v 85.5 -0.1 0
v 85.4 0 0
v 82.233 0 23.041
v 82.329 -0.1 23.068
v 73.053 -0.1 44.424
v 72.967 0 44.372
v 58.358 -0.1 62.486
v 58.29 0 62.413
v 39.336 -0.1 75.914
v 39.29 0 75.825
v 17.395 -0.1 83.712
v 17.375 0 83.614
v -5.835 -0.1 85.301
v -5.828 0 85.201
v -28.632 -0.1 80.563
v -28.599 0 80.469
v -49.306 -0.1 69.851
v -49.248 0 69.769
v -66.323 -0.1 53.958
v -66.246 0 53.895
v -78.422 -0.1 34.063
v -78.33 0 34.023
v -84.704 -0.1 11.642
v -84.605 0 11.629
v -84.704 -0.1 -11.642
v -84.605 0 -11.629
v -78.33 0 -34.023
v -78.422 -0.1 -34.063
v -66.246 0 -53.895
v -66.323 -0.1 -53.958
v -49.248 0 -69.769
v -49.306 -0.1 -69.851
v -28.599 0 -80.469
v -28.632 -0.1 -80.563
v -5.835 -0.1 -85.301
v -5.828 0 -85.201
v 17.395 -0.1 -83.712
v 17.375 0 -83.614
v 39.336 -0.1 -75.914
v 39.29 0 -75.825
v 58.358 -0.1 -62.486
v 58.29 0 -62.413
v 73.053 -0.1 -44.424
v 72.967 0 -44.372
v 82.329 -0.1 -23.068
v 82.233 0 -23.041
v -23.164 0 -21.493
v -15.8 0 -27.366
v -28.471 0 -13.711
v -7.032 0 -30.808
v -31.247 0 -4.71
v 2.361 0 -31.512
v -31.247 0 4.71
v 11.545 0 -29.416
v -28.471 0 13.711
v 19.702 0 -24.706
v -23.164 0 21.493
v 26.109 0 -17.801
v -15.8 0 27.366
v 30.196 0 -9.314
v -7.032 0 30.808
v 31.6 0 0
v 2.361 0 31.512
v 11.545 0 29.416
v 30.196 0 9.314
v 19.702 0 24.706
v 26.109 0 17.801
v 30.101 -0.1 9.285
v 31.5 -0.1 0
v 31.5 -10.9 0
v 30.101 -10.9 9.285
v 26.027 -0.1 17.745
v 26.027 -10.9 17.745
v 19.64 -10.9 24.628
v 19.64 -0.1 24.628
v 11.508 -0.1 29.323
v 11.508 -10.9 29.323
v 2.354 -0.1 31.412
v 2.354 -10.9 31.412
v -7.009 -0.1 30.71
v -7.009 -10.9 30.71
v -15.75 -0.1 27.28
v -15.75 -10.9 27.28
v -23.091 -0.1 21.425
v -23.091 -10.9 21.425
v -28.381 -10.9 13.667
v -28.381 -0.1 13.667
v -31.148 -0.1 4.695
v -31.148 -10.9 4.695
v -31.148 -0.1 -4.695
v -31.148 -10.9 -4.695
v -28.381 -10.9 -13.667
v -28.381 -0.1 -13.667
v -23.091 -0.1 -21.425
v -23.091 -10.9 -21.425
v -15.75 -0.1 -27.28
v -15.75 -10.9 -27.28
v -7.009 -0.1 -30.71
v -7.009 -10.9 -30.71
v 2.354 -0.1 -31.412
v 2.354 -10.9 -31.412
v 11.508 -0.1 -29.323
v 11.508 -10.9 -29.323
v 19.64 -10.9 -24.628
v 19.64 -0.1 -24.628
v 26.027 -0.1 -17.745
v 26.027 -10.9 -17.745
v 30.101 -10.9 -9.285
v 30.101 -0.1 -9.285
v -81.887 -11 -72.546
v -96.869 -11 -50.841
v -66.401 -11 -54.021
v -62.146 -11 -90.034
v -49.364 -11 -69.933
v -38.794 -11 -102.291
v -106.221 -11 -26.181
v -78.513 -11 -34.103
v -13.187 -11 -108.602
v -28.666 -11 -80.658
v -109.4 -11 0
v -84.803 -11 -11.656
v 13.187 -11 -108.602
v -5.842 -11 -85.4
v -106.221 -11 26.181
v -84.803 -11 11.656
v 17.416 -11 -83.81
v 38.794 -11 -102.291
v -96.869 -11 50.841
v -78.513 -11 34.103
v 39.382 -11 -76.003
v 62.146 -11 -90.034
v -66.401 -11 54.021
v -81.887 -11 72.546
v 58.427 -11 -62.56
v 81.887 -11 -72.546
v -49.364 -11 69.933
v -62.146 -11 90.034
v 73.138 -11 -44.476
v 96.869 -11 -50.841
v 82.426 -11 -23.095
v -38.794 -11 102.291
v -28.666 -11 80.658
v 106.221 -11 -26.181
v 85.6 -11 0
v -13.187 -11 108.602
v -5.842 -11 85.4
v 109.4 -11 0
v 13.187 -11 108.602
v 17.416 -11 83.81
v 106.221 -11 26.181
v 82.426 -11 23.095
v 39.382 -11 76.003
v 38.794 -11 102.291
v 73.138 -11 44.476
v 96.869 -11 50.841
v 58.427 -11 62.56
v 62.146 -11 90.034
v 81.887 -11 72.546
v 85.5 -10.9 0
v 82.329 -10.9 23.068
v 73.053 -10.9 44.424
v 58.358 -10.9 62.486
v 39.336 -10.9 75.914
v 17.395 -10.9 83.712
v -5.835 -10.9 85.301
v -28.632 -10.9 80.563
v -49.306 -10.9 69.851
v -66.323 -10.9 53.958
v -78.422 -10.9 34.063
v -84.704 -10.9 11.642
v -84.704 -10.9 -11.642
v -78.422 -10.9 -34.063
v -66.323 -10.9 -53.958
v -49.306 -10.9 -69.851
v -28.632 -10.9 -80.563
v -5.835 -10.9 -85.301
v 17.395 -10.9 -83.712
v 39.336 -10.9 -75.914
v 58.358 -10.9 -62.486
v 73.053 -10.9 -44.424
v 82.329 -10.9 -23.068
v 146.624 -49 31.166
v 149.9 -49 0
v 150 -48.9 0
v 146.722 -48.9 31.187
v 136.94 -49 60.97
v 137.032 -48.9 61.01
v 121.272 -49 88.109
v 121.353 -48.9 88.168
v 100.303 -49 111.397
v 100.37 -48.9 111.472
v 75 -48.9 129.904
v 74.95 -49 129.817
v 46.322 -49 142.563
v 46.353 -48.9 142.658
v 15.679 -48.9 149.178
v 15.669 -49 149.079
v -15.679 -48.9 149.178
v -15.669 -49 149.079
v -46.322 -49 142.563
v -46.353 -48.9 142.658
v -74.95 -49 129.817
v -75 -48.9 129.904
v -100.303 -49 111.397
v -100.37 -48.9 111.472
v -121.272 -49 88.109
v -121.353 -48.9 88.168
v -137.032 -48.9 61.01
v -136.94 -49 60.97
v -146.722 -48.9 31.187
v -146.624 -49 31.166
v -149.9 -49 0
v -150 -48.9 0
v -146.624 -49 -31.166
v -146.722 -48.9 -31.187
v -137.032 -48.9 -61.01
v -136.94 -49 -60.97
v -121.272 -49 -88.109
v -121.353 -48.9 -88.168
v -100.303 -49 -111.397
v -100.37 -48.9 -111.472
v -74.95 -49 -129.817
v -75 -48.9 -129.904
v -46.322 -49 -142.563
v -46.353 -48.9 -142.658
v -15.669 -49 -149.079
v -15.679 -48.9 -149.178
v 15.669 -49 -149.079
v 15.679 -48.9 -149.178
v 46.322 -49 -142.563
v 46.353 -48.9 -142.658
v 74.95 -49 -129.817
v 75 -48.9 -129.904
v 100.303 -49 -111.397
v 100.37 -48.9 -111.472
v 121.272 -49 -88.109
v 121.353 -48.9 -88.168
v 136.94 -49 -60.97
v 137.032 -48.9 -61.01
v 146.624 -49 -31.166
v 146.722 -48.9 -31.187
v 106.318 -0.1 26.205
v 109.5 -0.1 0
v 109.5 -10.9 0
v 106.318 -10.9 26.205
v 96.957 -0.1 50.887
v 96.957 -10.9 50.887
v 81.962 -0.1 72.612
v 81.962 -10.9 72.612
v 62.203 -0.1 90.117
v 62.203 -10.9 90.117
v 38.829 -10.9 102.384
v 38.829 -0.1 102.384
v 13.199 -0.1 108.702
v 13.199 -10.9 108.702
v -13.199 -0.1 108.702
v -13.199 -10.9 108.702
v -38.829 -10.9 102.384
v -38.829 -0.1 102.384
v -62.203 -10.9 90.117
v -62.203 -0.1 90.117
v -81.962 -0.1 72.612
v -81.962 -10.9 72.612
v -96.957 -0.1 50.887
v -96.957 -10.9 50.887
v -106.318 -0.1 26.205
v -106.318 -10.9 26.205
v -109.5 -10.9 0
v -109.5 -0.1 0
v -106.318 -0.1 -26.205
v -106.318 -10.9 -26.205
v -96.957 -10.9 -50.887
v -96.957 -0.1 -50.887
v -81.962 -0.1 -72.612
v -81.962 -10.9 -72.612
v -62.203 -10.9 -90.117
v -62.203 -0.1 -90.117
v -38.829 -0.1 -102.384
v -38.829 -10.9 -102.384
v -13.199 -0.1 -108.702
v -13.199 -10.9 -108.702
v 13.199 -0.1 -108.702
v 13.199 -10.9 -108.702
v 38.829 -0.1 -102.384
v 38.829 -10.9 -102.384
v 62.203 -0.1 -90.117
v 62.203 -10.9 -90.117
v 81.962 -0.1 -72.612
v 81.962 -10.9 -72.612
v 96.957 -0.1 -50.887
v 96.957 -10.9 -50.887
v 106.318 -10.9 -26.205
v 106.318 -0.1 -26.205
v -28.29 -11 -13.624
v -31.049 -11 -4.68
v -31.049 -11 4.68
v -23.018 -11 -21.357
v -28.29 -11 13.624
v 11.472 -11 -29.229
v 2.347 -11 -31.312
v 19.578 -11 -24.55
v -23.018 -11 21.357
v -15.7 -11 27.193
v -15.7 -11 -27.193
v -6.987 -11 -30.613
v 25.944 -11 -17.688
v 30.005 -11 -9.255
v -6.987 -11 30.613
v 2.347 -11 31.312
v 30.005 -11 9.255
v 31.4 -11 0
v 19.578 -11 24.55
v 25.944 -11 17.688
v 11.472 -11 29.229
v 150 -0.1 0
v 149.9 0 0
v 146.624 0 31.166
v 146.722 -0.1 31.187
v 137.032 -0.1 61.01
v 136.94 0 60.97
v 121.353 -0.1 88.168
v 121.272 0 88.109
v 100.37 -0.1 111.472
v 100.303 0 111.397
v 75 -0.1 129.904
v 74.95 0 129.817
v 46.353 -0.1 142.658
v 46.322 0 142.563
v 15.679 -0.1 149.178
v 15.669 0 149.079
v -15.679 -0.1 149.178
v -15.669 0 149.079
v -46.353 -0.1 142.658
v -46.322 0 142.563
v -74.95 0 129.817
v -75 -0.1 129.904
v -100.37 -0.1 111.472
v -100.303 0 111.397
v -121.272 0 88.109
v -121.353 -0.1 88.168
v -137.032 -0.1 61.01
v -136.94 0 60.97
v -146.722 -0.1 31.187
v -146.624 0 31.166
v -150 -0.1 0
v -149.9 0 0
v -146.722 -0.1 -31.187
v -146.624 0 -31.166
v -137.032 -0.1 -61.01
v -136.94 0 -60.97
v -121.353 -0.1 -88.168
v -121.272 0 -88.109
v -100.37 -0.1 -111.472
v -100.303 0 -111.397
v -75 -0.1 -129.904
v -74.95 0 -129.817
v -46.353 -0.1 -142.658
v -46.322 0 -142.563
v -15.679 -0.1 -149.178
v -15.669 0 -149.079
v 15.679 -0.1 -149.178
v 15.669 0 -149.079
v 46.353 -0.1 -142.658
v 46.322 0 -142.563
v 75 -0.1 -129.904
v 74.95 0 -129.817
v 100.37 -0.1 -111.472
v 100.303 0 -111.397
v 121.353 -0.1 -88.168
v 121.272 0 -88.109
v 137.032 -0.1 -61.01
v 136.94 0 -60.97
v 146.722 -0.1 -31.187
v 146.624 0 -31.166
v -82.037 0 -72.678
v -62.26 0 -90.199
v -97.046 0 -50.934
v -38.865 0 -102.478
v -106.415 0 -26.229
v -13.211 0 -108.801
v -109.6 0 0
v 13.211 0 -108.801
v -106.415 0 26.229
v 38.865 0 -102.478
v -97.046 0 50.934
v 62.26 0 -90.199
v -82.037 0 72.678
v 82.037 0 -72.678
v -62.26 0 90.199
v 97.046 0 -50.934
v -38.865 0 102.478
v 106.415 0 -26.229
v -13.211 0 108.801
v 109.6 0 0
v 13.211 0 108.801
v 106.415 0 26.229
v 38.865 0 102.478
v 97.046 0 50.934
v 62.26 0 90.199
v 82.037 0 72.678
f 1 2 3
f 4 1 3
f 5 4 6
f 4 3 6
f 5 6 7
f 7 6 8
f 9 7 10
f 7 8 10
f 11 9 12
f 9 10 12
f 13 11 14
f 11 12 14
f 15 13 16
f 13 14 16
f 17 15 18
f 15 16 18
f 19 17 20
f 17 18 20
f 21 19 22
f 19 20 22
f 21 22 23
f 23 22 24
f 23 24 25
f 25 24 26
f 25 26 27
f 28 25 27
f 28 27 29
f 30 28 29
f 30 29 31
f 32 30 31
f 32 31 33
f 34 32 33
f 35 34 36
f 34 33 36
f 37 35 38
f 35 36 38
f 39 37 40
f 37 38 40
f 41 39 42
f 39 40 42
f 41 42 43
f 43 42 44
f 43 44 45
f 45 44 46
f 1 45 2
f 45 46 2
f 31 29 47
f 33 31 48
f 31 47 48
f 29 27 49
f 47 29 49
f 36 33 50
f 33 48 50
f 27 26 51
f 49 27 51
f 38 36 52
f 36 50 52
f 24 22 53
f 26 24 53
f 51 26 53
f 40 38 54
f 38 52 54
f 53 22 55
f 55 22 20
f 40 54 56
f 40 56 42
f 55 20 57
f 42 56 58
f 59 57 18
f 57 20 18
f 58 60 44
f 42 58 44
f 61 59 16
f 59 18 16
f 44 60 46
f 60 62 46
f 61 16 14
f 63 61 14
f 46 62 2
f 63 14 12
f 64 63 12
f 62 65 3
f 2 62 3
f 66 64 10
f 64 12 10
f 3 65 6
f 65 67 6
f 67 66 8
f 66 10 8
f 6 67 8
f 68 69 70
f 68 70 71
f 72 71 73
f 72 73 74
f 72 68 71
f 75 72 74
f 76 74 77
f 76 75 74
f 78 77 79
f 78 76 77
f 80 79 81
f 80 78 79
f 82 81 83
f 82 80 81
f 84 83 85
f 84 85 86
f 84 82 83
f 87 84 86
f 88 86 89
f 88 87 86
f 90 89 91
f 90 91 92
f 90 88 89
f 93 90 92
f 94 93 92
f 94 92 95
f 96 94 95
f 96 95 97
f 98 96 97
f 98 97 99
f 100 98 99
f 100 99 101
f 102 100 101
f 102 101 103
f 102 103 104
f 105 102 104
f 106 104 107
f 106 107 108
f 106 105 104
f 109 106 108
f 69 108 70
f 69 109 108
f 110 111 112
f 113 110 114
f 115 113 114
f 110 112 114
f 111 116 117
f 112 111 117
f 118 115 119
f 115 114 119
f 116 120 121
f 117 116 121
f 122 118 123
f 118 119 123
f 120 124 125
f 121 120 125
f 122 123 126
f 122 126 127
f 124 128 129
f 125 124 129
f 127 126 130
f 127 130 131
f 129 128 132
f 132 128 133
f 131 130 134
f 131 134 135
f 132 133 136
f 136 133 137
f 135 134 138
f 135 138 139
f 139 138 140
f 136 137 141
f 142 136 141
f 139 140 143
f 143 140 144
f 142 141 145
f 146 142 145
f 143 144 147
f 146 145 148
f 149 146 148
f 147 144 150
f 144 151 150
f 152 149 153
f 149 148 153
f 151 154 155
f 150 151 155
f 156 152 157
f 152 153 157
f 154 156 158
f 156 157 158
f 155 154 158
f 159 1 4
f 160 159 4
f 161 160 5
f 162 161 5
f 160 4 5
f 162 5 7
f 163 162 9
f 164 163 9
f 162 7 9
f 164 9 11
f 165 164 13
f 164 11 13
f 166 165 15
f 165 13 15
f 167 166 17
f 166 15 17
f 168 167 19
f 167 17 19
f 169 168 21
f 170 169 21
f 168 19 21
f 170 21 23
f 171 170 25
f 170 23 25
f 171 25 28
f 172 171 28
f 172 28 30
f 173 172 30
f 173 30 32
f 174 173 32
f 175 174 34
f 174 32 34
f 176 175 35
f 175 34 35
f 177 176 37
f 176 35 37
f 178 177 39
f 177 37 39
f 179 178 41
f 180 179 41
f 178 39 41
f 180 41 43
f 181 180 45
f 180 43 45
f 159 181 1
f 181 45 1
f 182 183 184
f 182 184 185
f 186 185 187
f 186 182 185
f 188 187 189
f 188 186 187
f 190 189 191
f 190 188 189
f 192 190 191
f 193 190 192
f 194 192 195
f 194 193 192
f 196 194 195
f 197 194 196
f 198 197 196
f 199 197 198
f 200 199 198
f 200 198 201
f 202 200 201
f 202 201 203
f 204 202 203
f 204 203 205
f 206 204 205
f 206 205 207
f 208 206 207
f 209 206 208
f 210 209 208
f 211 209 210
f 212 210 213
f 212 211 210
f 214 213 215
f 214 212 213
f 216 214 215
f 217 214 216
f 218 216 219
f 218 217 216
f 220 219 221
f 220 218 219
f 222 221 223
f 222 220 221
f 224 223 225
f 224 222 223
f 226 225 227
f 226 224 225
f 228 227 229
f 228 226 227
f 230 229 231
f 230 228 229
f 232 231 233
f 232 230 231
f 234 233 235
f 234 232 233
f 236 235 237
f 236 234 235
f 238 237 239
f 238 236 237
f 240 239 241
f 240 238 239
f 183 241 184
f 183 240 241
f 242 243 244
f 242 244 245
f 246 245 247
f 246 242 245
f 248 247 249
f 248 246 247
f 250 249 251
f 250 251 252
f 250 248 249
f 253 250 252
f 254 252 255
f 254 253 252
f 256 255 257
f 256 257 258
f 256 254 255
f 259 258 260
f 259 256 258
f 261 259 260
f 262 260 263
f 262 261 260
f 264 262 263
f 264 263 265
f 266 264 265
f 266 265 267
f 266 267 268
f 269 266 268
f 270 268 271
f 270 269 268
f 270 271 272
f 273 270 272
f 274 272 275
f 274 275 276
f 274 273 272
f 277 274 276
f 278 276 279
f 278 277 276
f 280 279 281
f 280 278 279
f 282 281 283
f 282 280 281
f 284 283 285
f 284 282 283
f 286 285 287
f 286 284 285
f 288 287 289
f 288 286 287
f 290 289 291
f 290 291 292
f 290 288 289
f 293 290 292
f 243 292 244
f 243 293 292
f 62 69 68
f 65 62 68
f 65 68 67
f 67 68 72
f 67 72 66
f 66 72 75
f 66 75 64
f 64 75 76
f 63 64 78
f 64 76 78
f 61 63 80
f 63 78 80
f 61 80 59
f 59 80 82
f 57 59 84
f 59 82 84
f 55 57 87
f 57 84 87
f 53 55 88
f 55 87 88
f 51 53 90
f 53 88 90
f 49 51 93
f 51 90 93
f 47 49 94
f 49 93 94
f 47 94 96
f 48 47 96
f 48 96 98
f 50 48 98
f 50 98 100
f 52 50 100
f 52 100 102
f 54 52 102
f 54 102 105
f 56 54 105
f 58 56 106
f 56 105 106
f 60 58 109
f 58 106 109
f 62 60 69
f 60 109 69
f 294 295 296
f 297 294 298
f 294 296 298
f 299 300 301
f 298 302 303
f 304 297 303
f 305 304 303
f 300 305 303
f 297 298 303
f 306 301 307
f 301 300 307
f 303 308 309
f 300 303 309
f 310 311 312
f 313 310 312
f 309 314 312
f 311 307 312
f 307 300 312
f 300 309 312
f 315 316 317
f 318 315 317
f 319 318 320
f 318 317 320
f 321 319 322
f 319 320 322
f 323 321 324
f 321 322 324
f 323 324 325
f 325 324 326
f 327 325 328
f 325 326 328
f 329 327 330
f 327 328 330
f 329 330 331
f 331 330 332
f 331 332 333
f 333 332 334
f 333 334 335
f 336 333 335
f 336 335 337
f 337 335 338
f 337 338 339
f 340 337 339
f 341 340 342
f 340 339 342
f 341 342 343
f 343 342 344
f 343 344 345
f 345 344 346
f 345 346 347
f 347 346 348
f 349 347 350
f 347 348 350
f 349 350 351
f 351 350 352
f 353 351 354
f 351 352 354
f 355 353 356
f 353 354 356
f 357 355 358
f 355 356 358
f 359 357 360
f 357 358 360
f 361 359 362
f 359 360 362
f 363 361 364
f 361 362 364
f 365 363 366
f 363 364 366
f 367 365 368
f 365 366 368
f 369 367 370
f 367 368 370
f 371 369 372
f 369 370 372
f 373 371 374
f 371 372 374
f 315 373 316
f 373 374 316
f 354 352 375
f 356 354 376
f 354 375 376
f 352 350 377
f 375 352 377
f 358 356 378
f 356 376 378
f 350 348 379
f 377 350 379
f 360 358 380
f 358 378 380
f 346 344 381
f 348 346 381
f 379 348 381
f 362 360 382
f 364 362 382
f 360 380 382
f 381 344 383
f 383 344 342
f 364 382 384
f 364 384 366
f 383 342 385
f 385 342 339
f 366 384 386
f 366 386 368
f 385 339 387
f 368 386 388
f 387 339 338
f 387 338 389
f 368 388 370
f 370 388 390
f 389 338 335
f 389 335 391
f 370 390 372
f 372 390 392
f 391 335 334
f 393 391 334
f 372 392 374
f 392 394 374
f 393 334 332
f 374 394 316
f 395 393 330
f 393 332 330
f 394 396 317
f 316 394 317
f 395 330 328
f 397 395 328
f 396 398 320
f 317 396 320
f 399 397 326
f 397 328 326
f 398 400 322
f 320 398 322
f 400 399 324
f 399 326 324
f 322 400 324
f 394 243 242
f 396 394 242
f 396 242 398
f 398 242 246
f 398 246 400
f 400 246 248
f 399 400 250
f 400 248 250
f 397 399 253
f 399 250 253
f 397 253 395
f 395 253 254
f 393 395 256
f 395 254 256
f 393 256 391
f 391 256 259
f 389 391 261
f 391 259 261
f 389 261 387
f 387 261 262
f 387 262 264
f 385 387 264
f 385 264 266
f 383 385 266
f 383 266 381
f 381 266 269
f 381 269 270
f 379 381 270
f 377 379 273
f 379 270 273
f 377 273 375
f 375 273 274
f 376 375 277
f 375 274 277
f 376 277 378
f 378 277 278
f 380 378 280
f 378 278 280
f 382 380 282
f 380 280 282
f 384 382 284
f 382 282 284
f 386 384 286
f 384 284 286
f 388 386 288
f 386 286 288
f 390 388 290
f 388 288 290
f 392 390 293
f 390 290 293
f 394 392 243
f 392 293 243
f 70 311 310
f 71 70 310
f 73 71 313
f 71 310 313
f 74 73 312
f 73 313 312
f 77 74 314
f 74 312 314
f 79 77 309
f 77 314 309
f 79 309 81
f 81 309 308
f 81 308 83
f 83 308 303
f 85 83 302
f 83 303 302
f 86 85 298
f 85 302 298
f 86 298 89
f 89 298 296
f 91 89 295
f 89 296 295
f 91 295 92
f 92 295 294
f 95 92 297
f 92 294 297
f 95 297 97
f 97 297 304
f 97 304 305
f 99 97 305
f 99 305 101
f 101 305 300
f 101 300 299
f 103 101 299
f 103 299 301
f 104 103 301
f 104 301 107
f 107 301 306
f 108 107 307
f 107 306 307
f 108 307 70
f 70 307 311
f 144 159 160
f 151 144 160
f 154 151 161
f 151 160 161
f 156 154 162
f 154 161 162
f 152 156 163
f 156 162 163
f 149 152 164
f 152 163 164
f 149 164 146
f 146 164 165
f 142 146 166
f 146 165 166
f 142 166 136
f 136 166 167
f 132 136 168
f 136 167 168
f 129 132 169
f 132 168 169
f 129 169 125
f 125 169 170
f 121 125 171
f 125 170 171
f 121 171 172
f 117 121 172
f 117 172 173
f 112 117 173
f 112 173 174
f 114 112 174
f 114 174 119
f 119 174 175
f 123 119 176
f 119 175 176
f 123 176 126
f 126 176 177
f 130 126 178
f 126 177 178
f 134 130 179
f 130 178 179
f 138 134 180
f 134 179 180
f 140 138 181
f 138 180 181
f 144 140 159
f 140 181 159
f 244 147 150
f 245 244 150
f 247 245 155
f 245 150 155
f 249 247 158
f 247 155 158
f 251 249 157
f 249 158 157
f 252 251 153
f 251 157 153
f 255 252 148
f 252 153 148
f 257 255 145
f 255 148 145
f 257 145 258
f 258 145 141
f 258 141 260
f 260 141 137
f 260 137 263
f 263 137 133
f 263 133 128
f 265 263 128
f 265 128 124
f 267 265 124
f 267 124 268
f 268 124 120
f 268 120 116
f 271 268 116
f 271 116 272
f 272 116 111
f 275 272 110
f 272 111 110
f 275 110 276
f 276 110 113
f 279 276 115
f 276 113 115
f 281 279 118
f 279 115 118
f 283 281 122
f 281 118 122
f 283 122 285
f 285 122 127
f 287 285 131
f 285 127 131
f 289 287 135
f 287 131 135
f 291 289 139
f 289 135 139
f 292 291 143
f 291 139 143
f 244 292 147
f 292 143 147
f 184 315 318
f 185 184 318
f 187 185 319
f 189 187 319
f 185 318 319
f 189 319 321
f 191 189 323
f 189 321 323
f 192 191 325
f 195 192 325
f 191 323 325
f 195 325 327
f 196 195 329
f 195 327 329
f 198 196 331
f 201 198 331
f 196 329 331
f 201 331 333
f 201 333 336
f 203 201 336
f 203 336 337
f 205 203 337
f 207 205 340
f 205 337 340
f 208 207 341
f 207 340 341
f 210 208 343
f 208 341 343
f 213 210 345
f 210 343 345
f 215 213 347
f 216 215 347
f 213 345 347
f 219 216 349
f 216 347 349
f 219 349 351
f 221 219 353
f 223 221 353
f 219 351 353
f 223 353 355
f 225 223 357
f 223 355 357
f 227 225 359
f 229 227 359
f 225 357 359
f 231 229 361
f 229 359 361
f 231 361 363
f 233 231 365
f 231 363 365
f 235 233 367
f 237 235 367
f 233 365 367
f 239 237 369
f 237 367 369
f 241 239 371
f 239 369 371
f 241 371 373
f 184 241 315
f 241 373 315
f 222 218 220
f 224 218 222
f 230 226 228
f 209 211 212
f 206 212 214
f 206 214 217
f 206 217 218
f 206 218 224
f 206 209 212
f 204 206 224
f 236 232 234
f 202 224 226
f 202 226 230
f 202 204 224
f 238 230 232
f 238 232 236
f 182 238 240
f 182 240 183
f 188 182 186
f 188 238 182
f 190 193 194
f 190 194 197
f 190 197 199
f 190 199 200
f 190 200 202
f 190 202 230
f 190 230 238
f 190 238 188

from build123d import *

# Parameters (mm, degrees)
F0_R     = 150
F1_DEPTH = 49
F2_R     = 109.5
F2_R_2   = 85.5
F2_R_3   = 31.5
F3_DEPTH = 11
F4_SIZE  = 0.1


# Not quite as in the source:
# - a feature names something its author has since deleted; it is built from what else it names


with BuildPart() as f1:
    # F0 (on Front) → F1 (new body)
    with BuildSketch(Plane.XZ):
        Circle(F0_R)
    extrude(amount=F1_DEPTH)

    # F2 (on Front) → F3 (cut)
    with BuildSketch(Plane.XZ):
        Circle(F2_R)
        Circle(F2_R_2, mode=Mode.SUBTRACT)
        Circle(F2_R_3)
    extrude(amount=F3_DEPTH, mode=Mode.SUBTRACT)

    # F4
    f4_edges = [f1.edges().sort_by_distance(p)[0] for p in [
        (-150, 0, 0),
        (150, -24.5, 0),
        (-150, -49, 0),
        (-109.5, 0, 0),
        (109.5, -5.5, 0),
        (-109.5, -11, 0),
        (-85.5, -11, 0),
        (-85.5, 0, 0),
        (85.5, -5.5, 0),
        (31.5, -5.5, 0),
        (-31.5, 0, 0),
        (-31.5, -11, 0),
    ]]
    chamfer(f4_edges, length=F4_SIZE)


solid = f1.part
